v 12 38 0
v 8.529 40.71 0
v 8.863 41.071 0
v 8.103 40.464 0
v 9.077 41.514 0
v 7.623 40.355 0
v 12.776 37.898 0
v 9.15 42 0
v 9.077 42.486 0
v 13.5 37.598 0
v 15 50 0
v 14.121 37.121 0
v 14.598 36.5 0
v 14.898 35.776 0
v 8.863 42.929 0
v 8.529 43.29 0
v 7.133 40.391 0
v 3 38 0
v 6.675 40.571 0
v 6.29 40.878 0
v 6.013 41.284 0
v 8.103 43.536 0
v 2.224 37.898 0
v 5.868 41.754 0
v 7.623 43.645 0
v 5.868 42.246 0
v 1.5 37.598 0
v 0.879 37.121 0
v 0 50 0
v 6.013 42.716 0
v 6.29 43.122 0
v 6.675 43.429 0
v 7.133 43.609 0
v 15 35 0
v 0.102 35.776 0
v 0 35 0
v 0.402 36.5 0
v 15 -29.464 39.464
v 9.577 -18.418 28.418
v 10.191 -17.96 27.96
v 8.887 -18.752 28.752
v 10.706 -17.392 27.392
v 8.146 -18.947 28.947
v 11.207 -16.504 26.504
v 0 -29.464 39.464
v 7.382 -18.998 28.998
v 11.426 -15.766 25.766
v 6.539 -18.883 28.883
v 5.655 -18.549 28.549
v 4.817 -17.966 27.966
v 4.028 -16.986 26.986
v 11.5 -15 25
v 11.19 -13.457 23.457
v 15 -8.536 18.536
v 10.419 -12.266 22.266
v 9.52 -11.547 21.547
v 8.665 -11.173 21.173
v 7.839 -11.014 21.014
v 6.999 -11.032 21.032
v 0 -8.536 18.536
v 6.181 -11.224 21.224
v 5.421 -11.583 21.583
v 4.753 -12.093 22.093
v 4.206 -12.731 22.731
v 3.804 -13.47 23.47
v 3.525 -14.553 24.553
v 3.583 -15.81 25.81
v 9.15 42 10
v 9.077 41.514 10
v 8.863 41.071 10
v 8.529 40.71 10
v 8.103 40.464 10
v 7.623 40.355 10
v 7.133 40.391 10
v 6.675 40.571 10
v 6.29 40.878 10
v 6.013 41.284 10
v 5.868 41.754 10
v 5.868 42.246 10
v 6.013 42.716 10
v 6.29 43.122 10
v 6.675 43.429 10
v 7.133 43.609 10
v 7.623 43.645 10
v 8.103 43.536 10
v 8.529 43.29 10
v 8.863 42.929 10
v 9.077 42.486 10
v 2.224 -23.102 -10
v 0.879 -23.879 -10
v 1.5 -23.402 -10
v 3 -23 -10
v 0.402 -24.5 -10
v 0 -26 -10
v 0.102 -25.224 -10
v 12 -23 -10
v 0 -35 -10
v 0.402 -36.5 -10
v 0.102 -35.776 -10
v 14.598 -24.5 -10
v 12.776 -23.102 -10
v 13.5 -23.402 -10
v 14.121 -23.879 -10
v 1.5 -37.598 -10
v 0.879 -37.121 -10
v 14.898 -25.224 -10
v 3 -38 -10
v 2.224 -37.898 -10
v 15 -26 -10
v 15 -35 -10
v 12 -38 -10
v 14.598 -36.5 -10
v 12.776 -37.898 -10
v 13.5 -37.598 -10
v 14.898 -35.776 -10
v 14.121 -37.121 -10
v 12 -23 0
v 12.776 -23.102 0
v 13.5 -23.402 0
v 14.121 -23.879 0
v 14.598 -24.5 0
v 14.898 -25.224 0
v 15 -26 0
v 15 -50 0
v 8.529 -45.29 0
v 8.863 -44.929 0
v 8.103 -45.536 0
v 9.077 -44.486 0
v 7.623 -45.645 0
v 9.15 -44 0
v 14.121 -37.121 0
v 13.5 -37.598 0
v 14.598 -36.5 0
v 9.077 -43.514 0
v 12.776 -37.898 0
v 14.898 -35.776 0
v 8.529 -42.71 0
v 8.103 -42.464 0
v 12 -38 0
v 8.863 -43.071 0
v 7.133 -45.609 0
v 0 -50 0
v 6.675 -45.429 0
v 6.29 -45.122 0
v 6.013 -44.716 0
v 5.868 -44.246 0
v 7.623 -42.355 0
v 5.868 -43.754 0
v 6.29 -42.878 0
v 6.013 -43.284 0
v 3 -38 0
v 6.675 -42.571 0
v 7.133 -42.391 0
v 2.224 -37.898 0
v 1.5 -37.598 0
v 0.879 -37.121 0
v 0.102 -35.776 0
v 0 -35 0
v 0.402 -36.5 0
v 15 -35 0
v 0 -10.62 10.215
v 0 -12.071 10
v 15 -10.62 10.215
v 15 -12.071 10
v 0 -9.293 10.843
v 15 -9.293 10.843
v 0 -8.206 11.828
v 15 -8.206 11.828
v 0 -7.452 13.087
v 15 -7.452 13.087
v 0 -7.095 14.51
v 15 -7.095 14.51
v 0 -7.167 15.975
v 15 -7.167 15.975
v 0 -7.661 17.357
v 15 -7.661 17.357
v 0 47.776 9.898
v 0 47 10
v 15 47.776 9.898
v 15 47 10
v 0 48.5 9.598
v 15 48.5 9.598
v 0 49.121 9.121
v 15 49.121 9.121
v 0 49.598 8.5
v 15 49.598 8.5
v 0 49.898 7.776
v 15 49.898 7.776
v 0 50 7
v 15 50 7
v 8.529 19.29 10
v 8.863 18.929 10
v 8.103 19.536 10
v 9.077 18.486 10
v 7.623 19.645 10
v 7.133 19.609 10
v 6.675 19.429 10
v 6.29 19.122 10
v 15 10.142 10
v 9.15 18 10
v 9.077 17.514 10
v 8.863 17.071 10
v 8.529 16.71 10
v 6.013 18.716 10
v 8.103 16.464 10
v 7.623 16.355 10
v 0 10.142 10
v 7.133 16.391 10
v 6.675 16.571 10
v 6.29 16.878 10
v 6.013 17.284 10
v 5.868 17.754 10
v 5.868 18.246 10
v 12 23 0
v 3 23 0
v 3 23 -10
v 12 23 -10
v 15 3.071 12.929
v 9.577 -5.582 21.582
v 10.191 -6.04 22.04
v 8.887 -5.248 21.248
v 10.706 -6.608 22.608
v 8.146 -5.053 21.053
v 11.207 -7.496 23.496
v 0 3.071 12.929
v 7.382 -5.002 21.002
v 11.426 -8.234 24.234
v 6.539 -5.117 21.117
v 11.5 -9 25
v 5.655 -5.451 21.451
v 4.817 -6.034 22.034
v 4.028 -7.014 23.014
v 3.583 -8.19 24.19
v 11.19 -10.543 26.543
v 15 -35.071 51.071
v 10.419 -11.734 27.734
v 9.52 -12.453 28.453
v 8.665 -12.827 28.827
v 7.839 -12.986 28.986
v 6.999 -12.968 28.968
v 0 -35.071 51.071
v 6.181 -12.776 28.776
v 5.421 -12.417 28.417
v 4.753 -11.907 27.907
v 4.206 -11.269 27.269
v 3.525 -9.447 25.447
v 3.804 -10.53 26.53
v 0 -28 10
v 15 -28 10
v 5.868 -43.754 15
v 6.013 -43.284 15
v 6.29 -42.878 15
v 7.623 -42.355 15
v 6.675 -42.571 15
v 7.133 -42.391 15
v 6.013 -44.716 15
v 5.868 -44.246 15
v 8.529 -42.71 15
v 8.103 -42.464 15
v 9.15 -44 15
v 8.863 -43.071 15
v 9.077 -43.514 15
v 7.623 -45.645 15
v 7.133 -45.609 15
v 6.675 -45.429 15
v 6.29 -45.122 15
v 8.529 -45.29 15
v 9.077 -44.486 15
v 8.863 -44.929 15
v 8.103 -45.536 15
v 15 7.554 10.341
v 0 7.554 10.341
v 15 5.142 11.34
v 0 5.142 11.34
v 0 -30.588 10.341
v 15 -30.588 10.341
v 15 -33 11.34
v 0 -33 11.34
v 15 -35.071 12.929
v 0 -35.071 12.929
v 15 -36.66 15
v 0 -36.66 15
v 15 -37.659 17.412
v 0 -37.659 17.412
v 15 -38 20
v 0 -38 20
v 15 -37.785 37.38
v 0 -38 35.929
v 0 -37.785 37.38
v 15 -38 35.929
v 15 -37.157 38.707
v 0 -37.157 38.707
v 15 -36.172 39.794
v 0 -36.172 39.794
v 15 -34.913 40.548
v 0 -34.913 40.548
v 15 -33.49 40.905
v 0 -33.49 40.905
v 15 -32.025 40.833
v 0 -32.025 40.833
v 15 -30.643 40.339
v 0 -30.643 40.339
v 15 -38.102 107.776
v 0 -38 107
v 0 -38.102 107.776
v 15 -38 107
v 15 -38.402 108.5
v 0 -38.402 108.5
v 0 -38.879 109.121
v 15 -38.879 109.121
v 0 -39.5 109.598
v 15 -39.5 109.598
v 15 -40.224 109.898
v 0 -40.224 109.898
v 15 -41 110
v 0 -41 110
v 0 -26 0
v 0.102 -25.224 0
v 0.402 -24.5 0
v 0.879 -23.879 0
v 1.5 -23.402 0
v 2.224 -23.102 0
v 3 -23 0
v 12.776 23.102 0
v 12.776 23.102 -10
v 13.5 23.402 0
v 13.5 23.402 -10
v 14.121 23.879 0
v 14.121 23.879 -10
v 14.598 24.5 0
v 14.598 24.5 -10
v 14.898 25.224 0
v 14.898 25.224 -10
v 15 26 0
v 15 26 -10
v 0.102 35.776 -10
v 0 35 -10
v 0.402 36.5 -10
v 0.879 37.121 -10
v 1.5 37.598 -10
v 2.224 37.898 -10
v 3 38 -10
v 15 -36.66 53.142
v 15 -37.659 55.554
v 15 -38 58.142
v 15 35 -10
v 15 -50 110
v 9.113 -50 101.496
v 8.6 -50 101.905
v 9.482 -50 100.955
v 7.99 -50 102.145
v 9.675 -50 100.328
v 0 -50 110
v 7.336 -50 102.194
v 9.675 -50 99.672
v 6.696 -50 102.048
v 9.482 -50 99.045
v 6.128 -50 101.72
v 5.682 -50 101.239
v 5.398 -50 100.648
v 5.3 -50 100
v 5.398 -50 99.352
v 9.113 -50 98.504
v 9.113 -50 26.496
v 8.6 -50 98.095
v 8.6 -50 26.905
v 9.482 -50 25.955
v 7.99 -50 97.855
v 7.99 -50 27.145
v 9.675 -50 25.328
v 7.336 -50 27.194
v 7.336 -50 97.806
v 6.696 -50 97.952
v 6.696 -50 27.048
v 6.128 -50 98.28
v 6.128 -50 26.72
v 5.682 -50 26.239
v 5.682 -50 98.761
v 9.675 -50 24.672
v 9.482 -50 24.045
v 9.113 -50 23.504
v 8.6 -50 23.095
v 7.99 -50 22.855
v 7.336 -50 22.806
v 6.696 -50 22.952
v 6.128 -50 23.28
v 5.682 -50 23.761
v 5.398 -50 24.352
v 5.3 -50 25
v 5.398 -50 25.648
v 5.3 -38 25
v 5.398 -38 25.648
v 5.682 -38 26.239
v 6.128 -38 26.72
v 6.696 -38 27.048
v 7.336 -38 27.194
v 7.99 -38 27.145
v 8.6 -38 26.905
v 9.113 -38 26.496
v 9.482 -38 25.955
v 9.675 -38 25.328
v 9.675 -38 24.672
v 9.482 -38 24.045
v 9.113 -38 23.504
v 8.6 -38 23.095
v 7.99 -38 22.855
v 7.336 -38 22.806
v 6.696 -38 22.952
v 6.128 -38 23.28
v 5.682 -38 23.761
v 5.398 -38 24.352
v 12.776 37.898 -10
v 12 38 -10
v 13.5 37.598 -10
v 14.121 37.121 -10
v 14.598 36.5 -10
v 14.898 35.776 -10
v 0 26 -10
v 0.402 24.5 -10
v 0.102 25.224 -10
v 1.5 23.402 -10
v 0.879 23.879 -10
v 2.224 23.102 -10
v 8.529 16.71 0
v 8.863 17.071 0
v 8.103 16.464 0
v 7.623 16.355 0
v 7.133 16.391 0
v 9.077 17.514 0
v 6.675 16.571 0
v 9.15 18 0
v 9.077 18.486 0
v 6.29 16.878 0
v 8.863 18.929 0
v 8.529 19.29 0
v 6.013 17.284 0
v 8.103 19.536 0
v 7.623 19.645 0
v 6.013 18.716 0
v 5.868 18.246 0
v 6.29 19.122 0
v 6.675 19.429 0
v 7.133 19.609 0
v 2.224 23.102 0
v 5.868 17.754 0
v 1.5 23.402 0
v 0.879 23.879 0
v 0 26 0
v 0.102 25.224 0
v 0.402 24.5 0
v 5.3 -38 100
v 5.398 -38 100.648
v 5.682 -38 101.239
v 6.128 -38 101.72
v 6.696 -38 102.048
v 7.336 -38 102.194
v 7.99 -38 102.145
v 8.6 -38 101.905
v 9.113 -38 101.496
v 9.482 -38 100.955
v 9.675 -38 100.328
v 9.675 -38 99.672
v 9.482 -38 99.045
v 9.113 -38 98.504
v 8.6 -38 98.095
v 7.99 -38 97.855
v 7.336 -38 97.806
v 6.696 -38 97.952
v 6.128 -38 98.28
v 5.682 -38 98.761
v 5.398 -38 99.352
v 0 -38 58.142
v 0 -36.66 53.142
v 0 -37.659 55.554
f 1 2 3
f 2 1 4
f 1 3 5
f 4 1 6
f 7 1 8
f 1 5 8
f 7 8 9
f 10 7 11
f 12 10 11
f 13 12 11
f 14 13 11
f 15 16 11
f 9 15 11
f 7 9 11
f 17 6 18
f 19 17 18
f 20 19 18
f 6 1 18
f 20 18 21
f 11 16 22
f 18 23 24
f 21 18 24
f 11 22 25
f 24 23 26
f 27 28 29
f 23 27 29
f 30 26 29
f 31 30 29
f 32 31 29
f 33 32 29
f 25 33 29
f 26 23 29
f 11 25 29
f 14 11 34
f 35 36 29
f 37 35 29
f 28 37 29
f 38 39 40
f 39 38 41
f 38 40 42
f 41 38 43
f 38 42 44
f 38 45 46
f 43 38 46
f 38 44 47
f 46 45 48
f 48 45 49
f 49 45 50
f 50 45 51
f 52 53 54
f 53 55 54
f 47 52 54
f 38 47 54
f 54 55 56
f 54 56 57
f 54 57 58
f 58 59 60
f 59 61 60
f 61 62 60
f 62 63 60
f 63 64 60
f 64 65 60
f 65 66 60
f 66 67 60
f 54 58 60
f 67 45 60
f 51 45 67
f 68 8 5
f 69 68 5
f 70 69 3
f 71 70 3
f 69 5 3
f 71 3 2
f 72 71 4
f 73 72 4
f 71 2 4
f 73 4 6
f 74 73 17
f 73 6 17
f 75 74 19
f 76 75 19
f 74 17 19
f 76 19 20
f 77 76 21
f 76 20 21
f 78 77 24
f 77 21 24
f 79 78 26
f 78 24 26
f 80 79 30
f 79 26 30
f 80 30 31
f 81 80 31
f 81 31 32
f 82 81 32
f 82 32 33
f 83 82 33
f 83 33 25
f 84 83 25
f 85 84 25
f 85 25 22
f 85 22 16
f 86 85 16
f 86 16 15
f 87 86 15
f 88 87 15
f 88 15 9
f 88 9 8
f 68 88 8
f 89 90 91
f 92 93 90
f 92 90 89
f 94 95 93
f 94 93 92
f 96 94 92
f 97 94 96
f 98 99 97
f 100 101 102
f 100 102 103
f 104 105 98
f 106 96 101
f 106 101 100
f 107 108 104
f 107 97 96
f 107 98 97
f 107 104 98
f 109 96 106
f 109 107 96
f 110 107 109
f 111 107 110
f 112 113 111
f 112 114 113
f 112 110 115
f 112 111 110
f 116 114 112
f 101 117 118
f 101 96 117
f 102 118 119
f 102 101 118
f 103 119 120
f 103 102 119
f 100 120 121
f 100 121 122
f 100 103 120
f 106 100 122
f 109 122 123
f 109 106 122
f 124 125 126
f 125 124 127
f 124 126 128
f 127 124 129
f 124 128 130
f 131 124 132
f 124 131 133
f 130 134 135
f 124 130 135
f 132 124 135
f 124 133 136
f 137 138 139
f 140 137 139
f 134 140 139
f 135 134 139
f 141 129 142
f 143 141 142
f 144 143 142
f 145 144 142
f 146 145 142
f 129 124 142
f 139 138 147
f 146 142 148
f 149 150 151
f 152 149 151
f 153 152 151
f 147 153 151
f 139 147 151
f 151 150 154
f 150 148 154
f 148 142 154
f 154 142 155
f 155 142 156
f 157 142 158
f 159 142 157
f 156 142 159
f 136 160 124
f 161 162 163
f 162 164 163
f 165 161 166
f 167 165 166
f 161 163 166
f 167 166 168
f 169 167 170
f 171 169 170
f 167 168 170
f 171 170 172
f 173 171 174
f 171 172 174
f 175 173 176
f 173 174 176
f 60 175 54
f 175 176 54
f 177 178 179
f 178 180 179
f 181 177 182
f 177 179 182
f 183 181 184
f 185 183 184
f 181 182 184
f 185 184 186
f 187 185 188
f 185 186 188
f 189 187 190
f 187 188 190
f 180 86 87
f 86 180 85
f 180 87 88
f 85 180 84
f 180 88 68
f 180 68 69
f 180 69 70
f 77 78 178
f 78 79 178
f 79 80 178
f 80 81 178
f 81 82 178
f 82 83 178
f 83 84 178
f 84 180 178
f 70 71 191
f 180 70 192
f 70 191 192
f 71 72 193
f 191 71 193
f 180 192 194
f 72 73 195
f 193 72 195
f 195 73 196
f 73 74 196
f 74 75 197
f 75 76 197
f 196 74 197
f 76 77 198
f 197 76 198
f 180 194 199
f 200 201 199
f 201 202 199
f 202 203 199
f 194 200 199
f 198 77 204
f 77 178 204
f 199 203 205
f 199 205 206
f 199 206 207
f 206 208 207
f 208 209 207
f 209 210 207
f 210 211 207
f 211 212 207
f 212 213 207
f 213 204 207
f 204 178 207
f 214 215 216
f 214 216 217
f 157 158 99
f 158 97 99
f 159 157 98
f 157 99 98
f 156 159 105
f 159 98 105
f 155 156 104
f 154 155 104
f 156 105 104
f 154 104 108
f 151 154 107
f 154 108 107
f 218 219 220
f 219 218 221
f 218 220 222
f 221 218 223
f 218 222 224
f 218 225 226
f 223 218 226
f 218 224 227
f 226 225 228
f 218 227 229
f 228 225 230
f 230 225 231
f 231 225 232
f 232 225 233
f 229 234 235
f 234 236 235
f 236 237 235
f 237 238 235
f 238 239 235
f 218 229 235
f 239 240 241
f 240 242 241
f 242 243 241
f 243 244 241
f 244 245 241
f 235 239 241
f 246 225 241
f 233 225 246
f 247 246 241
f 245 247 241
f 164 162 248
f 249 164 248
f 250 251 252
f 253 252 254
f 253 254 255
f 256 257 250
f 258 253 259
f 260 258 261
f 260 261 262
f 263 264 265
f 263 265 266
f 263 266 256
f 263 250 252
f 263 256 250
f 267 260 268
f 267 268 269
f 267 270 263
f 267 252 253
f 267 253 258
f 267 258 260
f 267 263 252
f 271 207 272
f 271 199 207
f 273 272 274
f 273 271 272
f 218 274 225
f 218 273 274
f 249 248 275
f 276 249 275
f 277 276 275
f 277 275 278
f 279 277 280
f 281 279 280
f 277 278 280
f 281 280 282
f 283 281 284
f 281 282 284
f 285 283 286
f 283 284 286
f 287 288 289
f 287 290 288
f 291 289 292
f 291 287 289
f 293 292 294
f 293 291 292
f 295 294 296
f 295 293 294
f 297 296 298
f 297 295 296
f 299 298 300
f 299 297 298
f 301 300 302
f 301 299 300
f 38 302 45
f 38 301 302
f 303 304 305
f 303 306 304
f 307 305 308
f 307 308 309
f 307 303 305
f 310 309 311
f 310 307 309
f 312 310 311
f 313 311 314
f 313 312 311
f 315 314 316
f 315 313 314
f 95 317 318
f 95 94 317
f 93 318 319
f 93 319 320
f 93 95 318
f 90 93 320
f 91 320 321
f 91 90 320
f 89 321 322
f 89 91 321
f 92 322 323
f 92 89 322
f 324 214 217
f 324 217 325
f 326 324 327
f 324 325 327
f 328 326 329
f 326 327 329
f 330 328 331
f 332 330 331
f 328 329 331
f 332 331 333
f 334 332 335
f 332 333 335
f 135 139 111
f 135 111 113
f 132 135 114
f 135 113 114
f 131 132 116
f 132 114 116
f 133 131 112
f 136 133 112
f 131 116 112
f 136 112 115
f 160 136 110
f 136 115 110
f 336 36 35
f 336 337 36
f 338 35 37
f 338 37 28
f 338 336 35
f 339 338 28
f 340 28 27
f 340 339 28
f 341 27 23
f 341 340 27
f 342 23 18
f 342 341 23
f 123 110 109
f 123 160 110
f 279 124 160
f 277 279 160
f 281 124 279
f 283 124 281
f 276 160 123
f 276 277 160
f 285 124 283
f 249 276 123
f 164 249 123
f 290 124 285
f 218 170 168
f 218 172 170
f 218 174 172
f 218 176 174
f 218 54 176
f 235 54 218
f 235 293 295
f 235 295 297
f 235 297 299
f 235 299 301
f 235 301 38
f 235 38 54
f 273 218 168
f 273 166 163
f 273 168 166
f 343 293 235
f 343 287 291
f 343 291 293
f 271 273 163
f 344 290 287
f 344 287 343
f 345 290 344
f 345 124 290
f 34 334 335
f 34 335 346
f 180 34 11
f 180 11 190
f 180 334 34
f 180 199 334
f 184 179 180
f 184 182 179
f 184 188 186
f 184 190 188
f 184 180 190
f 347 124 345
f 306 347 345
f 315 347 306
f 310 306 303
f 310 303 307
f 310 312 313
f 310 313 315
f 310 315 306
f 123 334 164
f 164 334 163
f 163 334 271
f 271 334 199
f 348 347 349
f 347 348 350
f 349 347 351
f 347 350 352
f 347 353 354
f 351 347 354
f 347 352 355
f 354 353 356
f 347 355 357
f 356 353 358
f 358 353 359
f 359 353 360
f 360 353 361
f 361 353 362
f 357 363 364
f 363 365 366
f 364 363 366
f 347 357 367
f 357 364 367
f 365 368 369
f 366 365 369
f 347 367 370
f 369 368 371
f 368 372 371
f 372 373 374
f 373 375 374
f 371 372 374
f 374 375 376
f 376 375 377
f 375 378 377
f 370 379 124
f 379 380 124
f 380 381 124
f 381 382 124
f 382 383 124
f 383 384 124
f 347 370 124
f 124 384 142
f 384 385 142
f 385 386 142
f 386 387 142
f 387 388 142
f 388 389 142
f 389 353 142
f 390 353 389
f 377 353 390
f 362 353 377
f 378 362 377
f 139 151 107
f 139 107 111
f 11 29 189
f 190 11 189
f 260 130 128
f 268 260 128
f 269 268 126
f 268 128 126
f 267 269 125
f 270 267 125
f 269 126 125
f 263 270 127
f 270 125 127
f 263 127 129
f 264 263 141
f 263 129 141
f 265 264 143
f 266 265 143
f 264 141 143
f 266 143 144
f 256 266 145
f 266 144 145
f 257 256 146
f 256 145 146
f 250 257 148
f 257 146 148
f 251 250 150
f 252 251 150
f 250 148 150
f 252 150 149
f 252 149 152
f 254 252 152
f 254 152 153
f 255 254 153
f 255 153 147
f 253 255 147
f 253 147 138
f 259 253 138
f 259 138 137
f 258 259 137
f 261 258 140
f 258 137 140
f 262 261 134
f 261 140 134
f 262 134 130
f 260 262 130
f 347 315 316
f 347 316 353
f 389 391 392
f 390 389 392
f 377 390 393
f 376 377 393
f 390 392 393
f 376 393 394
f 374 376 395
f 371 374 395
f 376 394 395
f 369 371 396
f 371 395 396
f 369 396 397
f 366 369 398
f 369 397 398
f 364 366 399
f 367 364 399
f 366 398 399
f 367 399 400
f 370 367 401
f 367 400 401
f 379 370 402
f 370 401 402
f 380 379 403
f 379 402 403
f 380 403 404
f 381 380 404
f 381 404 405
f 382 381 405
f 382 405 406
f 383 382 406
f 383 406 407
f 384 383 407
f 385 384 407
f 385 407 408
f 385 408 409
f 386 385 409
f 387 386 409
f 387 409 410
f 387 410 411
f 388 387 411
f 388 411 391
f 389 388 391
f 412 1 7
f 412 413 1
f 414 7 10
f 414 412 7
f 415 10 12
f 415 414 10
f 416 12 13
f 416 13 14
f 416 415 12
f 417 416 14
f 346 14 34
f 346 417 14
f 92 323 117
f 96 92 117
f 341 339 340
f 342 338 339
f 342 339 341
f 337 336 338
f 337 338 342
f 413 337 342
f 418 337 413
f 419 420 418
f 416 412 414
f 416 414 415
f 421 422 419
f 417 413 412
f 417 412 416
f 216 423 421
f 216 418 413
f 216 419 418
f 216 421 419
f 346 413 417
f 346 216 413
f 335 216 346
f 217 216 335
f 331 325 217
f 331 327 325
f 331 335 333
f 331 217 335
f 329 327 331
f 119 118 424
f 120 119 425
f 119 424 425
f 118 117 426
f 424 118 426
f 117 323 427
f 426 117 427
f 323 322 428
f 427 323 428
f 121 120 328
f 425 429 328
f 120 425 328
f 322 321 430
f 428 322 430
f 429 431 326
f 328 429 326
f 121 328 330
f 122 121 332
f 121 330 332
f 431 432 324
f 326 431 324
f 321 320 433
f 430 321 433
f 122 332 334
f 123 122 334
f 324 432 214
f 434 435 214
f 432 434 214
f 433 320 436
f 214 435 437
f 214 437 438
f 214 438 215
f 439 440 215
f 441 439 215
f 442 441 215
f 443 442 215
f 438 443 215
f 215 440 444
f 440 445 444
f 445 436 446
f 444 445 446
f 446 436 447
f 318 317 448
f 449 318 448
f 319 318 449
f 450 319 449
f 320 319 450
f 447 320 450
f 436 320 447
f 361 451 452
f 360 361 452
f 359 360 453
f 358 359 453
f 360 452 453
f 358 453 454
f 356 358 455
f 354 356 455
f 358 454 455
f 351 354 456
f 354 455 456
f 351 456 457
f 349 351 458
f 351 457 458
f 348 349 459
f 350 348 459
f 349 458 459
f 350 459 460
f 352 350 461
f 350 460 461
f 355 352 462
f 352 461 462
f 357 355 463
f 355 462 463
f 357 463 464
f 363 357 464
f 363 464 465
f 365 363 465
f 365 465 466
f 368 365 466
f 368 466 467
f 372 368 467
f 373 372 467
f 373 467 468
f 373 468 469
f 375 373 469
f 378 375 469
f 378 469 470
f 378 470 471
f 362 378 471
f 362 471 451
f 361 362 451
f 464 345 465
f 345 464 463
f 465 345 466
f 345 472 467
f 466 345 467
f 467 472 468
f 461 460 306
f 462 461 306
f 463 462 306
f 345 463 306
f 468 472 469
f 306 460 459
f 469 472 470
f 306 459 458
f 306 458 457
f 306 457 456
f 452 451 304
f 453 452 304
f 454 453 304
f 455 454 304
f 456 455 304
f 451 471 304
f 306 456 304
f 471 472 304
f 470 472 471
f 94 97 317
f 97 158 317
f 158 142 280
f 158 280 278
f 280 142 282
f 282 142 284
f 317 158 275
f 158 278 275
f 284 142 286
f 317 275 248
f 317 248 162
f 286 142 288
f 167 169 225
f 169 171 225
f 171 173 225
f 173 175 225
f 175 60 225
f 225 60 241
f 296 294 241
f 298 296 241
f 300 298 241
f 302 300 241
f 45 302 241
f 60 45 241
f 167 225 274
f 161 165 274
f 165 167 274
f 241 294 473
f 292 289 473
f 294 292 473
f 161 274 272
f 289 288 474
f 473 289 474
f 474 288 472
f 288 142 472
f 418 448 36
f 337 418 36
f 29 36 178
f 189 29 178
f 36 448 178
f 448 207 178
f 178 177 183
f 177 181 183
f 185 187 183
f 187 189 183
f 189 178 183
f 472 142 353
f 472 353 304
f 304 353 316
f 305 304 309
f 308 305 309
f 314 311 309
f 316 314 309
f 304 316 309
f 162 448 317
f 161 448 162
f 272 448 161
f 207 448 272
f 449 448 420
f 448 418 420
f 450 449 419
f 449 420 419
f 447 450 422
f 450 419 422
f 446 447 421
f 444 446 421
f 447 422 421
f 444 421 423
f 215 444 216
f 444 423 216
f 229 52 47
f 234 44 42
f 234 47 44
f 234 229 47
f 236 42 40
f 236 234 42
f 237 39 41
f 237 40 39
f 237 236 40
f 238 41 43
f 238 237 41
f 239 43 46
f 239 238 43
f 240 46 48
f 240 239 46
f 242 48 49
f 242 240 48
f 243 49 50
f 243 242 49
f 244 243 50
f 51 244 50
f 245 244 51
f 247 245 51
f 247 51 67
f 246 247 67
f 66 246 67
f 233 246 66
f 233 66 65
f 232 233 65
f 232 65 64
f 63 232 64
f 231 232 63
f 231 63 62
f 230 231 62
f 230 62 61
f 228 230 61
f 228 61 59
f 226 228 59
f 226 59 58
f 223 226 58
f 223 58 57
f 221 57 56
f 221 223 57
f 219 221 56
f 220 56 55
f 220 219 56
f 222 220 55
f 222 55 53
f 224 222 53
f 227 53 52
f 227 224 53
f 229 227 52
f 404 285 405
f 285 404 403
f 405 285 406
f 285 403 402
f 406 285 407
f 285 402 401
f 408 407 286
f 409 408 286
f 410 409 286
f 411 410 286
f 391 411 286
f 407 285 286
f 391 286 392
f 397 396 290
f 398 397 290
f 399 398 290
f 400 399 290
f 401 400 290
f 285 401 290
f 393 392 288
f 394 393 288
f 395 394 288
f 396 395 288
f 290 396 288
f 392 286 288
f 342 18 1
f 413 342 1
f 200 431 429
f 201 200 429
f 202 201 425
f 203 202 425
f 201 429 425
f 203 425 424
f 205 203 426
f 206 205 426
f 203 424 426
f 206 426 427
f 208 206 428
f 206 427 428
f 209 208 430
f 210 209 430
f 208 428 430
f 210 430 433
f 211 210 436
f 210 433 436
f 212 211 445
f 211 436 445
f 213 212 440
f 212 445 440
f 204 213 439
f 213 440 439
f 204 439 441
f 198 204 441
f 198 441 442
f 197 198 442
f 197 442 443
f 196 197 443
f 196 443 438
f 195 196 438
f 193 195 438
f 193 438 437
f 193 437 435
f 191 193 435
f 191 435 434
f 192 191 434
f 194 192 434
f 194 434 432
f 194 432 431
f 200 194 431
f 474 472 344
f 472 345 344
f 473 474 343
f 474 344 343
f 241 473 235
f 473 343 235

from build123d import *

# Parameters (mm, degrees)
F1_DEPTH  = 15
F2_DEPTH  = 15
F3_R      = 10
F4_R      = 5
F5_R      = 3
F7_D      = 4.4
F8_R      = 4
F9_DEPTH  = 23.5
F10_W     = 15
F10_H     = 15
F11_DEPTH = 10
F12_DEPTH = 10
F10_R     = 1.65
F13_DEPTH = 15
F14_R     = 3


with BuildPart() as f1:
    # F0 (on Right) → F1 (new body)
    with BuildSketch(Plane.YZ):
        with BuildLine():
            Line((-50, 0), (0, 0))
            Line((0, 0), (50, 0))
            Line((50, 0), (50, 10))
            Line((50, 10), (6, 10))
            Line((6, 10), (0, 10))
            Line((0, 10), (-28, 10))
            ThreePointArc((-28, 10), (-35.0710678119, 12.9289321881), (-38, 20))
            Line((-38, 20), (-38, 48))
            Line((-38, 48), (-38, 54))
            Line((-38, 54), (-38, 110))
            Line((-38, 110), (-50, 110))
            Line((-50, 110), (-50, 10))
            Line((-50, 10), (-50, 0))
        make_face()
    extrude(amount=F1_DEPTH)

    # F0 (on Right) → F2 (join, through all)
    with BuildSketch(Plane.YZ):
        Polygon((0, 10), (6, 10), (-38, 54), (-38, 48), align=None)
    extrude(amount=F2_DEPTH)

    # F3
    f3_edges = [f1.edges().sort_by_distance(p)[0] for p in [
        (7.5, 6, 10),
        (7.5, -38, 54),
    ]]
    fillet(f3_edges, radius=F3_R)

    # F4
    f4_edges = [f1.edges().sort_by_distance(p)[0] for p in [
        (7.5, 0, 10),
        (7.5, -38, 48),
    ]]
    fillet(f4_edges, radius=F4_R)

    # F5
    f5_edges = [f1.edges().sort_by_distance(p)[0] for p in [
        (7.5, 50, 10),
        (7.5, -38, 110),
    ]]
    fillet(f5_edges, radius=F5_R)

    # F7 (through all)
    with Locations(Plane.XZ.offset(50)):
        with Locations((7.5, 100), (7.5, 25)):
            Hole(F7_D / 2)

    # F8 (on Front) → F9 (cut)
    with BuildSketch(Plane.XZ):
        with Locations((7.5, 25)):
            Circle(F8_R)
    extrude(amount=F9_DEPTH, mode=Mode.SUBTRACT)

    # F10 (on face) → F11 (join)
    with BuildSketch(Plane(origin=(0, 0, 0), x_dir=(1, 0, 0), z_dir=(0, 0, -1))):
        with Locations((7.5, 30.5)):
            Rectangle(F10_W, F10_H)
    extrude(amount=F11_DEPTH)

    # F10 (on face) → F12 (join)
    with BuildSketch(Plane(origin=(0, 0, 0), x_dir=(1, 0, 0), z_dir=(0, 0, -1))):
        with Locations((7.5, -30.5)):
            Rectangle(F10_W, F10_H)
    extrude(amount=F12_DEPTH)

    # F10 (on face) → F13 (cut)
    with BuildSketch(Plane(origin=(0, 0, 0), x_dir=(1, 0, 0), z_dir=(0, 0, -1))):
        with Locations((7.5, -42)):
            Circle(F10_R)
        with Locations((7.5, -18)):
            Circle(F10_R)
        with Locations((7.5, 44)):
            Circle(F10_R)
    extrude(amount=-F13_DEPTH, mode=Mode.SUBTRACT)

    # F14
    f14_edges = [f1.edges().sort_by_distance(p)[0] for p in [
        (15, -38, -5),
        (0, -38, -5),
        (0, -23, -5),
        (15, 23, -5),
        (15, 38, -5),
        (0, 38, -5),
        (0, 23, -5),
        (15, -23, -5),
    ]]
    fillet(f14_edges, radius=F14_R)


solid = f1.part
